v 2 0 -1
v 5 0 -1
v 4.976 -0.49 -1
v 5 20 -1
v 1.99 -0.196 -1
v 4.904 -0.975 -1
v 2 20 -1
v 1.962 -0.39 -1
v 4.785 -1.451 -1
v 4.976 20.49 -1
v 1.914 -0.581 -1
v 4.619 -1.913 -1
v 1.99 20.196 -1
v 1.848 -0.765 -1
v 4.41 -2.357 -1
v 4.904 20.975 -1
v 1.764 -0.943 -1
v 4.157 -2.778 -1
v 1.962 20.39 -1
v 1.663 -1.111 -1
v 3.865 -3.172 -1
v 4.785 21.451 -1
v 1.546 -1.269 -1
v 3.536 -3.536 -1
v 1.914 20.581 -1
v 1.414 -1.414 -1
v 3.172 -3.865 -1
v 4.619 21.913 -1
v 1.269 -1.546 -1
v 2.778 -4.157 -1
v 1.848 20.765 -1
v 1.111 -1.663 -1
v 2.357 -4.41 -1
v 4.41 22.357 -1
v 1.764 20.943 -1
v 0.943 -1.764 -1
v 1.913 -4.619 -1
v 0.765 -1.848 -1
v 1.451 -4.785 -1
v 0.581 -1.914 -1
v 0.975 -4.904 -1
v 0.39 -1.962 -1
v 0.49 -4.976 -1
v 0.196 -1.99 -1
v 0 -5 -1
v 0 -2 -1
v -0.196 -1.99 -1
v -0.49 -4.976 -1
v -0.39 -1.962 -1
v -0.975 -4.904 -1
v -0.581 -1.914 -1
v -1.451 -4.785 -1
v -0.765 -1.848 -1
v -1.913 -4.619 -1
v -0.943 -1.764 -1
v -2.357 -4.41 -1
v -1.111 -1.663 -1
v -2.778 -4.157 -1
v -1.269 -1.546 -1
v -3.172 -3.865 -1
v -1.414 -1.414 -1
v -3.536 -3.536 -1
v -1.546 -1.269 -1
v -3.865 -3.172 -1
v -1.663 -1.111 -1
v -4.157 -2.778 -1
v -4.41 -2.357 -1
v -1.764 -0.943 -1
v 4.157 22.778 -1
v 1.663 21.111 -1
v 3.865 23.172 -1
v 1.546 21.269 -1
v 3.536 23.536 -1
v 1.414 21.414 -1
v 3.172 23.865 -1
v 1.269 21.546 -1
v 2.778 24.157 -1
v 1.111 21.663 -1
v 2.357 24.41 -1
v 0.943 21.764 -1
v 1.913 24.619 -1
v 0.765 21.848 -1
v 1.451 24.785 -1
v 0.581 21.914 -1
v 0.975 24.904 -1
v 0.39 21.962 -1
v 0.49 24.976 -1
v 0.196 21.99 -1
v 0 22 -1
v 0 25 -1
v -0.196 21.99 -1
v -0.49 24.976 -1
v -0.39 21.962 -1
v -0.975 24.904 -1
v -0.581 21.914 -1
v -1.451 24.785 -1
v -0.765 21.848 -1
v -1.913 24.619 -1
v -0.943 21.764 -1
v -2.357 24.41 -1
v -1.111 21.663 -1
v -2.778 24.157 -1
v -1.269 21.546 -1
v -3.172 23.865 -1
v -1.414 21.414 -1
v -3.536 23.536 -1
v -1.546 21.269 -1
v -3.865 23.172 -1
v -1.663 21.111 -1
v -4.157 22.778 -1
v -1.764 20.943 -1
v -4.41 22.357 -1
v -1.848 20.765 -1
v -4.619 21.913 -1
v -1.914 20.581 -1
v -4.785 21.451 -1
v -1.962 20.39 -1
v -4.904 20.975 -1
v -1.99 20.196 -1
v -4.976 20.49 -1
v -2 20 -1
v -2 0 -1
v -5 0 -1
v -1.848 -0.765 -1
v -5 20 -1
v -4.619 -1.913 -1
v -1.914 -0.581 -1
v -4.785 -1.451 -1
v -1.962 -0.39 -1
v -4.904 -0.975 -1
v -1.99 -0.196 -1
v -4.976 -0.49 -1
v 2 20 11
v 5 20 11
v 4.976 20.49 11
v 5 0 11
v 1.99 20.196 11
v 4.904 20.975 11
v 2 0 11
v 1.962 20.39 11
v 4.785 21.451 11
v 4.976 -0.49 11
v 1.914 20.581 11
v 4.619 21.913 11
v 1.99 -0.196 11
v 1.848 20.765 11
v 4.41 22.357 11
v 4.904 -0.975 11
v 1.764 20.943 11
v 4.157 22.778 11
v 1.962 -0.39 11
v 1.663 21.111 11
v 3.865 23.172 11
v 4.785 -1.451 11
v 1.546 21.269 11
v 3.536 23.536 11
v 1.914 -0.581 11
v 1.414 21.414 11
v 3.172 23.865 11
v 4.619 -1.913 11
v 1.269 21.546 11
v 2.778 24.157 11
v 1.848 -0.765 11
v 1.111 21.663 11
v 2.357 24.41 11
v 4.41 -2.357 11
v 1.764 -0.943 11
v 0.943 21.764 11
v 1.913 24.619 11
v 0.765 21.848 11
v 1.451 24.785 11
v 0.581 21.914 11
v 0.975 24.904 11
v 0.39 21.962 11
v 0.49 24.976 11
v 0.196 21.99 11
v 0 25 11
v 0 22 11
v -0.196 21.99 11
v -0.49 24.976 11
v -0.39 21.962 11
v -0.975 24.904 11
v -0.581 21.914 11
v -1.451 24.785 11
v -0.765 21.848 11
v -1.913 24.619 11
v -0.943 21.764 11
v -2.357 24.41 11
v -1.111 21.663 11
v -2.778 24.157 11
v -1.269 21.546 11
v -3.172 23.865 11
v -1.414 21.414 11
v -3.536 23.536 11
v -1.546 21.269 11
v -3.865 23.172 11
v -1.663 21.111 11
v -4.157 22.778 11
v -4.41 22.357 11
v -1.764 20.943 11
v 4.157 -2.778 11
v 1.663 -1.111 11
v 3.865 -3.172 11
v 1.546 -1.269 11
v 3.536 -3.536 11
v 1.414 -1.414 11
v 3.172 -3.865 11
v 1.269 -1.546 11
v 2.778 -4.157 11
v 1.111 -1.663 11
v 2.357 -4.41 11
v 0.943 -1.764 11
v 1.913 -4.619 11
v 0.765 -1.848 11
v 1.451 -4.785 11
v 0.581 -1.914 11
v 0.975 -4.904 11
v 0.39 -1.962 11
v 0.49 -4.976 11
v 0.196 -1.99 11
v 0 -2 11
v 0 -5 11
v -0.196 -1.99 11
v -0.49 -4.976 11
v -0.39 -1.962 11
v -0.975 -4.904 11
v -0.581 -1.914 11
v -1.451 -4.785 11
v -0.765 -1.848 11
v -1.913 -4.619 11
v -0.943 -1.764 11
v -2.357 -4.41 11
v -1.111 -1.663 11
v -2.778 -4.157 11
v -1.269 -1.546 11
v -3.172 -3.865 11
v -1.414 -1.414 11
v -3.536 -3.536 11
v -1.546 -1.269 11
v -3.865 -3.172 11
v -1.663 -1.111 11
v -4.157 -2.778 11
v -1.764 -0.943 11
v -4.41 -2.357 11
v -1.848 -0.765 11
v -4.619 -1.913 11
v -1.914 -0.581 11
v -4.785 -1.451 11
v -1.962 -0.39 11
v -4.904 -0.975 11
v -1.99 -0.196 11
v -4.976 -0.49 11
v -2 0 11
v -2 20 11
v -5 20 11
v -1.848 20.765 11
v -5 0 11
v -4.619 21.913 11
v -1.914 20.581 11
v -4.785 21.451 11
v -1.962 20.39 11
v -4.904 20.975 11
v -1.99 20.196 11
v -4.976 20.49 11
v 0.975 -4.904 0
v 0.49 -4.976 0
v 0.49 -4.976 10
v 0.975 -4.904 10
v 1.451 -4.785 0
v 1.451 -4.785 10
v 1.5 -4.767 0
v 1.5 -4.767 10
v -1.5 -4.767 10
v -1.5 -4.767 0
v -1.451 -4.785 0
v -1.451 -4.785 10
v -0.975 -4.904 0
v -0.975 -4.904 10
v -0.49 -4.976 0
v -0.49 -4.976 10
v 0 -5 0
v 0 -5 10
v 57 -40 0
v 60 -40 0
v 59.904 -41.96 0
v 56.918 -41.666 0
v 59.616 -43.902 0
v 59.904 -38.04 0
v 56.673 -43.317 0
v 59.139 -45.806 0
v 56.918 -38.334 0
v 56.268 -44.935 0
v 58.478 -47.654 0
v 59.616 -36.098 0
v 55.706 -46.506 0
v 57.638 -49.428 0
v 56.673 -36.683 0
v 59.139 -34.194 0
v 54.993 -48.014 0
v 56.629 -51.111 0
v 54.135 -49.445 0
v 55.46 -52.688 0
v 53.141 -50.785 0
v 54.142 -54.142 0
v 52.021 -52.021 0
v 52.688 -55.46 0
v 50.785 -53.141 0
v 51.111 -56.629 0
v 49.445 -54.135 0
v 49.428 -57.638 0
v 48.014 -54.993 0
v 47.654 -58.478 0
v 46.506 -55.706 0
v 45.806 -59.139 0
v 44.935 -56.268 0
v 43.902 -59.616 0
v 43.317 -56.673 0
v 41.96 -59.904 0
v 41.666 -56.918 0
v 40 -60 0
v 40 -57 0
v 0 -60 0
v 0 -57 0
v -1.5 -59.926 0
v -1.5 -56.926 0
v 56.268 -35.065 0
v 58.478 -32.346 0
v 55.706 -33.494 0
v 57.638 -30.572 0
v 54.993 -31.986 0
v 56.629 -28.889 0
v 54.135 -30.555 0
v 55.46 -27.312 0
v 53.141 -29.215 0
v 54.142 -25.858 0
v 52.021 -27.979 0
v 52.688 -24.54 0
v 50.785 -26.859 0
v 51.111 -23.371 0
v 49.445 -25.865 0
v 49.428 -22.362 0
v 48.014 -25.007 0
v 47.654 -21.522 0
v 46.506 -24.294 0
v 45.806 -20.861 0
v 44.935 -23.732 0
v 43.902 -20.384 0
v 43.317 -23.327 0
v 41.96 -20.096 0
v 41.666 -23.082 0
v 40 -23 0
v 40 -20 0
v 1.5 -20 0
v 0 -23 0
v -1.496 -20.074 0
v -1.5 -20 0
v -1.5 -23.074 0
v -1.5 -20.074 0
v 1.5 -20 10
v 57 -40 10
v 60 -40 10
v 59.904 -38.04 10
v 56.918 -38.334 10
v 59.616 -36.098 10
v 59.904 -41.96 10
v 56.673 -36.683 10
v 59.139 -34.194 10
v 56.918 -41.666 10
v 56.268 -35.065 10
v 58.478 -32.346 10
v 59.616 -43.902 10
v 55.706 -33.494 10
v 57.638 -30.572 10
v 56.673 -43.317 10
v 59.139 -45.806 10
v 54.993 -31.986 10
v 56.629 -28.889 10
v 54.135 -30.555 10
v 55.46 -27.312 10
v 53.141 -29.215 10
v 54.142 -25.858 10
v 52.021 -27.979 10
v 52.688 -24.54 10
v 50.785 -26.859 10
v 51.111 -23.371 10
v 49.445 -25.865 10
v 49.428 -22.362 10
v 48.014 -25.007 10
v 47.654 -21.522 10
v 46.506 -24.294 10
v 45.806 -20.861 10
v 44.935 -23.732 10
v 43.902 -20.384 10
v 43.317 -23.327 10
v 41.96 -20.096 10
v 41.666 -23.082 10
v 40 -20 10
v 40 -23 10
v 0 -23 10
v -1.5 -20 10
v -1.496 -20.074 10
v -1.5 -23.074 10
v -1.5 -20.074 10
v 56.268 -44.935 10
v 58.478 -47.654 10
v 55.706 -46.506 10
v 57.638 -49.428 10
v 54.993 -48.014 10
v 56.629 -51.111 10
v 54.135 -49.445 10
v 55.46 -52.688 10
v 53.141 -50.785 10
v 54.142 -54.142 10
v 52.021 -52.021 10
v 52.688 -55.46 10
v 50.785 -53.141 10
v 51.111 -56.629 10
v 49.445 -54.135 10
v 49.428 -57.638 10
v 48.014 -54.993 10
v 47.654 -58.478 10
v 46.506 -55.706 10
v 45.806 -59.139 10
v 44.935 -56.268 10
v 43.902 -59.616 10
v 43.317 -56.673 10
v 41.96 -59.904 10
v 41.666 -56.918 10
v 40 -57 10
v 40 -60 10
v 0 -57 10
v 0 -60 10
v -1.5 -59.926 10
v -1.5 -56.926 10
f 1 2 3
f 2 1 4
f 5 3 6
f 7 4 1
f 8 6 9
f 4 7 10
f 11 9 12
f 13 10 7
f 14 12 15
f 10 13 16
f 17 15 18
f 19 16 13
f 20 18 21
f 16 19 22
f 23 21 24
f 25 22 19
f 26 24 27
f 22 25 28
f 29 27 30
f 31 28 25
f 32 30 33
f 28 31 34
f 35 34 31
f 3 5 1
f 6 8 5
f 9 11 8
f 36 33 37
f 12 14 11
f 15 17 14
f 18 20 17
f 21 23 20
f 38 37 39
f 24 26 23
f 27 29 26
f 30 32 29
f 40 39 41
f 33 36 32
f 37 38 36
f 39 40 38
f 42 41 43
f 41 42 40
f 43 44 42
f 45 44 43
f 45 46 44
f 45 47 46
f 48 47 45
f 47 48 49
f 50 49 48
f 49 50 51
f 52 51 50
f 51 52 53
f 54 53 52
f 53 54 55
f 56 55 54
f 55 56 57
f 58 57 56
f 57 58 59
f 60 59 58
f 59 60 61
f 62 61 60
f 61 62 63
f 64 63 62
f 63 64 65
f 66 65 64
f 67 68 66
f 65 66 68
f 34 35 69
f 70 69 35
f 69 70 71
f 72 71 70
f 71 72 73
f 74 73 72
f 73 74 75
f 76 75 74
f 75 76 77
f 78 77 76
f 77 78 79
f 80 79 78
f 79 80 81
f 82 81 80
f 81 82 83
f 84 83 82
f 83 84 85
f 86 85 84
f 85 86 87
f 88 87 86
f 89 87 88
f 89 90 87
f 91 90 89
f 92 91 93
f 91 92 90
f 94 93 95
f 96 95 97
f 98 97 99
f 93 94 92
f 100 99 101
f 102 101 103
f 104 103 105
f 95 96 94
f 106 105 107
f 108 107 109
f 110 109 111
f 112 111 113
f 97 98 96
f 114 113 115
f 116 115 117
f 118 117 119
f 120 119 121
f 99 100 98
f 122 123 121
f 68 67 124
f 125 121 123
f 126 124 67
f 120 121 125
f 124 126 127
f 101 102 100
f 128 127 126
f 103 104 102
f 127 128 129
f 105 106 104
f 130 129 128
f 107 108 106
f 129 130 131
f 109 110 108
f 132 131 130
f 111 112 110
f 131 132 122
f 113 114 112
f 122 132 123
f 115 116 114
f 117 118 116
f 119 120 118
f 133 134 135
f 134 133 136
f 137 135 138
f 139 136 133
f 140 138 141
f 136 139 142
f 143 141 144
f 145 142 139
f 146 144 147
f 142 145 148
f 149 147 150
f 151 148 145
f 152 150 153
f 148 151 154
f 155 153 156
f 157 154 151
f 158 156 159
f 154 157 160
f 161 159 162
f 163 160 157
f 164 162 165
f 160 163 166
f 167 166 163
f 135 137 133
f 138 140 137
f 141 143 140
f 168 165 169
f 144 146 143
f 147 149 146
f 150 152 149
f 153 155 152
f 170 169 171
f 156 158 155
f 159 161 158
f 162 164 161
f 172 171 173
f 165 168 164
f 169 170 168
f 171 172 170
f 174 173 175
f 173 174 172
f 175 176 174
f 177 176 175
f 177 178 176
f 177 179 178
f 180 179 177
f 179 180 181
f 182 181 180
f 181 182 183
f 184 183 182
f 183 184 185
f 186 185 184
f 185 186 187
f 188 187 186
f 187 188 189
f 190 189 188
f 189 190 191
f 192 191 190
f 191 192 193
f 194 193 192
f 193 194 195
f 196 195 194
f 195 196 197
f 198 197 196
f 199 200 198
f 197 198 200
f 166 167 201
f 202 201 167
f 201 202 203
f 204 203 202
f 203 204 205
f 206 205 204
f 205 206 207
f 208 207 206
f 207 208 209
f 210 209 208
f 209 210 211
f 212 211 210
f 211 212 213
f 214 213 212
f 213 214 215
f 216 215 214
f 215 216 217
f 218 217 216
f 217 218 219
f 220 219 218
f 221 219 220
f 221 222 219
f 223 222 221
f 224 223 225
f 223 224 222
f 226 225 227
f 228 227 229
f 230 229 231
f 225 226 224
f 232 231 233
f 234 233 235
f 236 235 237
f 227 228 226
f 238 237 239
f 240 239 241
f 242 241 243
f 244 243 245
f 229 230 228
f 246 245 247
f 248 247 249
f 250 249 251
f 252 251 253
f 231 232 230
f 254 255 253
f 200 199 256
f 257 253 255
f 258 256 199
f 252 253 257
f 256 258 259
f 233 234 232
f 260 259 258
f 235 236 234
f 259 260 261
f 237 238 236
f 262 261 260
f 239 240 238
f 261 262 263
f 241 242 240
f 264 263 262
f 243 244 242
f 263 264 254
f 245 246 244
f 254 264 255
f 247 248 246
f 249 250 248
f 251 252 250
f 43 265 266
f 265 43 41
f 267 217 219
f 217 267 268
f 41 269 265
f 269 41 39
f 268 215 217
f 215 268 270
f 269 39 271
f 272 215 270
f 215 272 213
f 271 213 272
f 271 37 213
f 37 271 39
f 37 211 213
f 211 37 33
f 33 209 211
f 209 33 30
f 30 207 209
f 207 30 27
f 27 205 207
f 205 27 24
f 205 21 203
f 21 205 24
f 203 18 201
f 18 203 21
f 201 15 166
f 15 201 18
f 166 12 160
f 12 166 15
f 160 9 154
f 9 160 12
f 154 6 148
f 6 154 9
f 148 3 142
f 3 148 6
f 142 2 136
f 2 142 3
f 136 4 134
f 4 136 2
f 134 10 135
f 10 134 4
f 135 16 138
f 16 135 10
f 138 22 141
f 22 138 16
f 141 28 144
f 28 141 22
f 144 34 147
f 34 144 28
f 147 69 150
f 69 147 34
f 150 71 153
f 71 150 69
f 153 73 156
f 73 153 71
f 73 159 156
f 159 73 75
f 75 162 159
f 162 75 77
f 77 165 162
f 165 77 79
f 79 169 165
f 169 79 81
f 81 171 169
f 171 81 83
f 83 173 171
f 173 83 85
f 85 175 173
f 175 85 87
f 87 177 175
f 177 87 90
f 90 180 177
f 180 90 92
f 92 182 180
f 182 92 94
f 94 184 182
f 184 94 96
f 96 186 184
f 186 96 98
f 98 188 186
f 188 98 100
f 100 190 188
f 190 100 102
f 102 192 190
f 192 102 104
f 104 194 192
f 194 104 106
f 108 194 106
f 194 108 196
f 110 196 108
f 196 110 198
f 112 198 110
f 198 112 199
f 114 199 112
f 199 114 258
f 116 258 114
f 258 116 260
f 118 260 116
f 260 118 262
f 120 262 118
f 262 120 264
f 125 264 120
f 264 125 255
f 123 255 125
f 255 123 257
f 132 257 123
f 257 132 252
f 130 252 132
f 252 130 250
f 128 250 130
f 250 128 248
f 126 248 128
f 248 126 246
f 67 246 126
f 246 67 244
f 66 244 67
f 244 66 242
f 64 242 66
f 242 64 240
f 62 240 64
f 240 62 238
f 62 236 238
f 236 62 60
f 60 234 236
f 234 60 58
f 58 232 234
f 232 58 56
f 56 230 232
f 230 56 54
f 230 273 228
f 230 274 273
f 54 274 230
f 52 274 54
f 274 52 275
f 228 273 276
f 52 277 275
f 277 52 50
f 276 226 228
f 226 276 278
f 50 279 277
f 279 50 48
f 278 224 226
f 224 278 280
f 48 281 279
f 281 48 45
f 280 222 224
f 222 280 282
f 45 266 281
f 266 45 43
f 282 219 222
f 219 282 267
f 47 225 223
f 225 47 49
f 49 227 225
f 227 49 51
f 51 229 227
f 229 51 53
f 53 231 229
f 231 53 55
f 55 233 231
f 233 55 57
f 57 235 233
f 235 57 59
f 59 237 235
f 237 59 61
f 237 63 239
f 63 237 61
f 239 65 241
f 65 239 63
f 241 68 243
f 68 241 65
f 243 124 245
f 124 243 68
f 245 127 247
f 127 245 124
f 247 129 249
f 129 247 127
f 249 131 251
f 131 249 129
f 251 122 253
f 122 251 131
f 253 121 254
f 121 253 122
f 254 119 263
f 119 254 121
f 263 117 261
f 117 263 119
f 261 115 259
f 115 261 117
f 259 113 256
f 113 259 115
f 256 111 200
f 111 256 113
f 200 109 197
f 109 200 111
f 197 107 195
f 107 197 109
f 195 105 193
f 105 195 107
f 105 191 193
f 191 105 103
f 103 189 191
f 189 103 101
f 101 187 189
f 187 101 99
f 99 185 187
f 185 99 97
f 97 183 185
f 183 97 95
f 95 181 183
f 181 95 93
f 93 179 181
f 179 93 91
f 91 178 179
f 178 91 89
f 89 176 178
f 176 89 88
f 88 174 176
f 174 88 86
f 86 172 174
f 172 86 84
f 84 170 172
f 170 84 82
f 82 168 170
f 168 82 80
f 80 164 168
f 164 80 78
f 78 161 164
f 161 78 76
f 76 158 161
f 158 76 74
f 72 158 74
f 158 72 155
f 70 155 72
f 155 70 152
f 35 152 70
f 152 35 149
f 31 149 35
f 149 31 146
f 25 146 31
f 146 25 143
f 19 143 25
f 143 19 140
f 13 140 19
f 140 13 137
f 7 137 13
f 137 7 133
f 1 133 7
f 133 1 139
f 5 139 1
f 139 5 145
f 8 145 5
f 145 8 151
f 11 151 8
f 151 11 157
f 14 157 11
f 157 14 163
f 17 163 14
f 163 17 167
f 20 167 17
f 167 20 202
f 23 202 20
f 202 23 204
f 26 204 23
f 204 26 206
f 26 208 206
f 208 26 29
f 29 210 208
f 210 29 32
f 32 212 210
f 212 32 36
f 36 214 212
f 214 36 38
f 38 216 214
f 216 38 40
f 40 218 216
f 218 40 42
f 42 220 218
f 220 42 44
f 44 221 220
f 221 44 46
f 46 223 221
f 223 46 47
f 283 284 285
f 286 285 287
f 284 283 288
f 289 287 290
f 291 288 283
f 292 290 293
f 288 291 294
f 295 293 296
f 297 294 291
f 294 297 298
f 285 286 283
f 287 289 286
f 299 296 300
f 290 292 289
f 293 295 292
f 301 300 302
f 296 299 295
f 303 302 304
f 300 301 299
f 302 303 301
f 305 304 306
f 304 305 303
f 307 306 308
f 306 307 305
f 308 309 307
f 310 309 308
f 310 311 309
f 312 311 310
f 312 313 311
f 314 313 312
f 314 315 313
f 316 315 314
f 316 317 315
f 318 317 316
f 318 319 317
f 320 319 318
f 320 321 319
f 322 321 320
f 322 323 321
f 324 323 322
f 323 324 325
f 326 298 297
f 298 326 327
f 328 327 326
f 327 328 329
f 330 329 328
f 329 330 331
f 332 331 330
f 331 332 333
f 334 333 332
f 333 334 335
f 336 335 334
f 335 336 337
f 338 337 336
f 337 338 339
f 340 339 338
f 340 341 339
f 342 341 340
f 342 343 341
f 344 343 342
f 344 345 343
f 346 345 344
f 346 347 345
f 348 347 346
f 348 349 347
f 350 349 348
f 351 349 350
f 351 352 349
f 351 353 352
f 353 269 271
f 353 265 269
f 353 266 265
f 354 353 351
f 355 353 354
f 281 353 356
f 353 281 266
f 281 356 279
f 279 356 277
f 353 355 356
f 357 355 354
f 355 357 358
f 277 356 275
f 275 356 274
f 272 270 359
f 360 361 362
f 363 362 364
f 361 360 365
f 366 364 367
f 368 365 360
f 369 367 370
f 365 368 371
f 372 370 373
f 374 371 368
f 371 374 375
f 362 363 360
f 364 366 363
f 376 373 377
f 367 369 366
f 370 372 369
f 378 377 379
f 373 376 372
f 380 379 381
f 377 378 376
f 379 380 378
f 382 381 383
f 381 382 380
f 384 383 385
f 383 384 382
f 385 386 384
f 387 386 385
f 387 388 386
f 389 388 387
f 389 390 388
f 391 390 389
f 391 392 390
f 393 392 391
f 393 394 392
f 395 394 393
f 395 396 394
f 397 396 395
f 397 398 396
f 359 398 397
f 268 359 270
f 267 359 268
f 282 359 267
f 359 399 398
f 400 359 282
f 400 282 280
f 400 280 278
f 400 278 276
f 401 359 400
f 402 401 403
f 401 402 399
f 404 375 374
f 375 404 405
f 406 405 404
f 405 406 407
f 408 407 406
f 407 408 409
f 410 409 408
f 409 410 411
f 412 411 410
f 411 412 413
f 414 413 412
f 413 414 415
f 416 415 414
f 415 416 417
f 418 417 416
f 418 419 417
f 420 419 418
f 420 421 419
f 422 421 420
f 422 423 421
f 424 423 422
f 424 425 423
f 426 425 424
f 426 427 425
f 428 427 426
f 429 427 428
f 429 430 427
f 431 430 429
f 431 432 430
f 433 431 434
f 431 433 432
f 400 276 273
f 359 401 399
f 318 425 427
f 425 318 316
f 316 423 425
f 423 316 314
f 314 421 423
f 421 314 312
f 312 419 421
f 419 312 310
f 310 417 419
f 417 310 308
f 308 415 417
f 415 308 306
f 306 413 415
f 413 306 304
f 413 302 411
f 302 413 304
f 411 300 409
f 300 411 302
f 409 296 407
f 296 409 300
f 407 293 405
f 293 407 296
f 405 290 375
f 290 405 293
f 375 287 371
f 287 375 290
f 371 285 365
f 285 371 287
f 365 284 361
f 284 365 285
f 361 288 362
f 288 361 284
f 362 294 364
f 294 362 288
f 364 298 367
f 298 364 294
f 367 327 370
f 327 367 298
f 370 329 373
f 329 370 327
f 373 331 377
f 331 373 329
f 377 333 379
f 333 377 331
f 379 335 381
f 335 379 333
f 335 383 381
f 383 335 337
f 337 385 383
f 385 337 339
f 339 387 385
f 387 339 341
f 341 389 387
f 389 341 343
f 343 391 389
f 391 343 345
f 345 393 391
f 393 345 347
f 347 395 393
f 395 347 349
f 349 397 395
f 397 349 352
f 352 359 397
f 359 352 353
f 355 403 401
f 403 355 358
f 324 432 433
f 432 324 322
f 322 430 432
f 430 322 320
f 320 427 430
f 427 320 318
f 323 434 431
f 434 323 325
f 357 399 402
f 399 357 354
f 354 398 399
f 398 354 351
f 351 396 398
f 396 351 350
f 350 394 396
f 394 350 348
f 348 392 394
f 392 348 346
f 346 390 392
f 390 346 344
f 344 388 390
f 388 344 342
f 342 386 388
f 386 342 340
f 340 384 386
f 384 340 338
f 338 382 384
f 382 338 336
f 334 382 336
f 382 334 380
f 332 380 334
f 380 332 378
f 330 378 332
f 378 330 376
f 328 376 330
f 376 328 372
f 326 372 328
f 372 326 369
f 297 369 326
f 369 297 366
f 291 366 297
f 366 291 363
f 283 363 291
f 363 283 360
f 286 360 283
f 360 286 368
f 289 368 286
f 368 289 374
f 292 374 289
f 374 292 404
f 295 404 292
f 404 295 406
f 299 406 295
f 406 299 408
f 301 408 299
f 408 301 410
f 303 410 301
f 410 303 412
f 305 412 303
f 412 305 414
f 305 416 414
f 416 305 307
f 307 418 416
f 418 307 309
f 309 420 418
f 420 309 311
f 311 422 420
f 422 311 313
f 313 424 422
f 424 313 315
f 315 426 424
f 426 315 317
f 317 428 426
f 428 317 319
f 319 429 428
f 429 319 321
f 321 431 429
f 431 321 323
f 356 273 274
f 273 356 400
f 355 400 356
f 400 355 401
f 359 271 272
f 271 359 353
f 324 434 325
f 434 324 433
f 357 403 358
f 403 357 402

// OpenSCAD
// ============================================================
// S-hook
// ============================================================
$fn = 64;

wire = 3;
h = 10;

// --- Top loop ---
loop_r = 5;
loop_spacing = 20;

// --- Middle loop (perpendicular) ---
middle_loop_r = 20;
middle_loop_spacing = 40;
middle_offset_x = 0;
middle_offset_y = -40;

// --- Connecting bar ---
bar_width = 3;

// --- Rectangle cutout ---
cutout_x = -21.5;
cutout_y = -60;
cutout_w = 20;
cutout_d = 40;

difference() {
    union() {
        // Top loop - stadium shape (vertical)
        translate([0,0,-1])
           linear_extrude(height = h+2)
              difference() {
                hull() {
                    translate([0, 0]) circle(r = loop_r);
                    translate([0, loop_spacing]) circle(r = loop_r);
                }
                hull() {
                    translate([0, 0]) circle(r = loop_r - wire);
                    translate([0, loop_spacing]) circle(r = loop_r - wire);
                }
            }

        // Middle loop - stadium shape (horizontal)
        translate([middle_offset_x, middle_offset_y, 0])
            linear_extrude(height = h)
                difference() {
                    hull() {
                        translate([0, 0]) circle(r = middle_loop_r);
                        translate([middle_loop_spacing, 0]) circle(r = middle_loop_r);
                    }
                    hull() {
                        translate([0, 0]) circle(r = middle_loop_r - wire);
                        translate([middle_loop_spacing, 0]) circle(r = middle_loop_r - wire);
                    }
                }

        // Connecting bar from top loop to middle loop
        linear_extrude(height = h)
            hull() {
                translate([0, -wire-1]) circle(r = bar_width/2);
                translate([0, -20]) circle(r = bar_width/2);
            }
    }

    // Rectangle cutout on the middle loop
    translate([cutout_x, cutout_y, -1])
        cube([cutout_w, cutout_d, h + 2]);
}
